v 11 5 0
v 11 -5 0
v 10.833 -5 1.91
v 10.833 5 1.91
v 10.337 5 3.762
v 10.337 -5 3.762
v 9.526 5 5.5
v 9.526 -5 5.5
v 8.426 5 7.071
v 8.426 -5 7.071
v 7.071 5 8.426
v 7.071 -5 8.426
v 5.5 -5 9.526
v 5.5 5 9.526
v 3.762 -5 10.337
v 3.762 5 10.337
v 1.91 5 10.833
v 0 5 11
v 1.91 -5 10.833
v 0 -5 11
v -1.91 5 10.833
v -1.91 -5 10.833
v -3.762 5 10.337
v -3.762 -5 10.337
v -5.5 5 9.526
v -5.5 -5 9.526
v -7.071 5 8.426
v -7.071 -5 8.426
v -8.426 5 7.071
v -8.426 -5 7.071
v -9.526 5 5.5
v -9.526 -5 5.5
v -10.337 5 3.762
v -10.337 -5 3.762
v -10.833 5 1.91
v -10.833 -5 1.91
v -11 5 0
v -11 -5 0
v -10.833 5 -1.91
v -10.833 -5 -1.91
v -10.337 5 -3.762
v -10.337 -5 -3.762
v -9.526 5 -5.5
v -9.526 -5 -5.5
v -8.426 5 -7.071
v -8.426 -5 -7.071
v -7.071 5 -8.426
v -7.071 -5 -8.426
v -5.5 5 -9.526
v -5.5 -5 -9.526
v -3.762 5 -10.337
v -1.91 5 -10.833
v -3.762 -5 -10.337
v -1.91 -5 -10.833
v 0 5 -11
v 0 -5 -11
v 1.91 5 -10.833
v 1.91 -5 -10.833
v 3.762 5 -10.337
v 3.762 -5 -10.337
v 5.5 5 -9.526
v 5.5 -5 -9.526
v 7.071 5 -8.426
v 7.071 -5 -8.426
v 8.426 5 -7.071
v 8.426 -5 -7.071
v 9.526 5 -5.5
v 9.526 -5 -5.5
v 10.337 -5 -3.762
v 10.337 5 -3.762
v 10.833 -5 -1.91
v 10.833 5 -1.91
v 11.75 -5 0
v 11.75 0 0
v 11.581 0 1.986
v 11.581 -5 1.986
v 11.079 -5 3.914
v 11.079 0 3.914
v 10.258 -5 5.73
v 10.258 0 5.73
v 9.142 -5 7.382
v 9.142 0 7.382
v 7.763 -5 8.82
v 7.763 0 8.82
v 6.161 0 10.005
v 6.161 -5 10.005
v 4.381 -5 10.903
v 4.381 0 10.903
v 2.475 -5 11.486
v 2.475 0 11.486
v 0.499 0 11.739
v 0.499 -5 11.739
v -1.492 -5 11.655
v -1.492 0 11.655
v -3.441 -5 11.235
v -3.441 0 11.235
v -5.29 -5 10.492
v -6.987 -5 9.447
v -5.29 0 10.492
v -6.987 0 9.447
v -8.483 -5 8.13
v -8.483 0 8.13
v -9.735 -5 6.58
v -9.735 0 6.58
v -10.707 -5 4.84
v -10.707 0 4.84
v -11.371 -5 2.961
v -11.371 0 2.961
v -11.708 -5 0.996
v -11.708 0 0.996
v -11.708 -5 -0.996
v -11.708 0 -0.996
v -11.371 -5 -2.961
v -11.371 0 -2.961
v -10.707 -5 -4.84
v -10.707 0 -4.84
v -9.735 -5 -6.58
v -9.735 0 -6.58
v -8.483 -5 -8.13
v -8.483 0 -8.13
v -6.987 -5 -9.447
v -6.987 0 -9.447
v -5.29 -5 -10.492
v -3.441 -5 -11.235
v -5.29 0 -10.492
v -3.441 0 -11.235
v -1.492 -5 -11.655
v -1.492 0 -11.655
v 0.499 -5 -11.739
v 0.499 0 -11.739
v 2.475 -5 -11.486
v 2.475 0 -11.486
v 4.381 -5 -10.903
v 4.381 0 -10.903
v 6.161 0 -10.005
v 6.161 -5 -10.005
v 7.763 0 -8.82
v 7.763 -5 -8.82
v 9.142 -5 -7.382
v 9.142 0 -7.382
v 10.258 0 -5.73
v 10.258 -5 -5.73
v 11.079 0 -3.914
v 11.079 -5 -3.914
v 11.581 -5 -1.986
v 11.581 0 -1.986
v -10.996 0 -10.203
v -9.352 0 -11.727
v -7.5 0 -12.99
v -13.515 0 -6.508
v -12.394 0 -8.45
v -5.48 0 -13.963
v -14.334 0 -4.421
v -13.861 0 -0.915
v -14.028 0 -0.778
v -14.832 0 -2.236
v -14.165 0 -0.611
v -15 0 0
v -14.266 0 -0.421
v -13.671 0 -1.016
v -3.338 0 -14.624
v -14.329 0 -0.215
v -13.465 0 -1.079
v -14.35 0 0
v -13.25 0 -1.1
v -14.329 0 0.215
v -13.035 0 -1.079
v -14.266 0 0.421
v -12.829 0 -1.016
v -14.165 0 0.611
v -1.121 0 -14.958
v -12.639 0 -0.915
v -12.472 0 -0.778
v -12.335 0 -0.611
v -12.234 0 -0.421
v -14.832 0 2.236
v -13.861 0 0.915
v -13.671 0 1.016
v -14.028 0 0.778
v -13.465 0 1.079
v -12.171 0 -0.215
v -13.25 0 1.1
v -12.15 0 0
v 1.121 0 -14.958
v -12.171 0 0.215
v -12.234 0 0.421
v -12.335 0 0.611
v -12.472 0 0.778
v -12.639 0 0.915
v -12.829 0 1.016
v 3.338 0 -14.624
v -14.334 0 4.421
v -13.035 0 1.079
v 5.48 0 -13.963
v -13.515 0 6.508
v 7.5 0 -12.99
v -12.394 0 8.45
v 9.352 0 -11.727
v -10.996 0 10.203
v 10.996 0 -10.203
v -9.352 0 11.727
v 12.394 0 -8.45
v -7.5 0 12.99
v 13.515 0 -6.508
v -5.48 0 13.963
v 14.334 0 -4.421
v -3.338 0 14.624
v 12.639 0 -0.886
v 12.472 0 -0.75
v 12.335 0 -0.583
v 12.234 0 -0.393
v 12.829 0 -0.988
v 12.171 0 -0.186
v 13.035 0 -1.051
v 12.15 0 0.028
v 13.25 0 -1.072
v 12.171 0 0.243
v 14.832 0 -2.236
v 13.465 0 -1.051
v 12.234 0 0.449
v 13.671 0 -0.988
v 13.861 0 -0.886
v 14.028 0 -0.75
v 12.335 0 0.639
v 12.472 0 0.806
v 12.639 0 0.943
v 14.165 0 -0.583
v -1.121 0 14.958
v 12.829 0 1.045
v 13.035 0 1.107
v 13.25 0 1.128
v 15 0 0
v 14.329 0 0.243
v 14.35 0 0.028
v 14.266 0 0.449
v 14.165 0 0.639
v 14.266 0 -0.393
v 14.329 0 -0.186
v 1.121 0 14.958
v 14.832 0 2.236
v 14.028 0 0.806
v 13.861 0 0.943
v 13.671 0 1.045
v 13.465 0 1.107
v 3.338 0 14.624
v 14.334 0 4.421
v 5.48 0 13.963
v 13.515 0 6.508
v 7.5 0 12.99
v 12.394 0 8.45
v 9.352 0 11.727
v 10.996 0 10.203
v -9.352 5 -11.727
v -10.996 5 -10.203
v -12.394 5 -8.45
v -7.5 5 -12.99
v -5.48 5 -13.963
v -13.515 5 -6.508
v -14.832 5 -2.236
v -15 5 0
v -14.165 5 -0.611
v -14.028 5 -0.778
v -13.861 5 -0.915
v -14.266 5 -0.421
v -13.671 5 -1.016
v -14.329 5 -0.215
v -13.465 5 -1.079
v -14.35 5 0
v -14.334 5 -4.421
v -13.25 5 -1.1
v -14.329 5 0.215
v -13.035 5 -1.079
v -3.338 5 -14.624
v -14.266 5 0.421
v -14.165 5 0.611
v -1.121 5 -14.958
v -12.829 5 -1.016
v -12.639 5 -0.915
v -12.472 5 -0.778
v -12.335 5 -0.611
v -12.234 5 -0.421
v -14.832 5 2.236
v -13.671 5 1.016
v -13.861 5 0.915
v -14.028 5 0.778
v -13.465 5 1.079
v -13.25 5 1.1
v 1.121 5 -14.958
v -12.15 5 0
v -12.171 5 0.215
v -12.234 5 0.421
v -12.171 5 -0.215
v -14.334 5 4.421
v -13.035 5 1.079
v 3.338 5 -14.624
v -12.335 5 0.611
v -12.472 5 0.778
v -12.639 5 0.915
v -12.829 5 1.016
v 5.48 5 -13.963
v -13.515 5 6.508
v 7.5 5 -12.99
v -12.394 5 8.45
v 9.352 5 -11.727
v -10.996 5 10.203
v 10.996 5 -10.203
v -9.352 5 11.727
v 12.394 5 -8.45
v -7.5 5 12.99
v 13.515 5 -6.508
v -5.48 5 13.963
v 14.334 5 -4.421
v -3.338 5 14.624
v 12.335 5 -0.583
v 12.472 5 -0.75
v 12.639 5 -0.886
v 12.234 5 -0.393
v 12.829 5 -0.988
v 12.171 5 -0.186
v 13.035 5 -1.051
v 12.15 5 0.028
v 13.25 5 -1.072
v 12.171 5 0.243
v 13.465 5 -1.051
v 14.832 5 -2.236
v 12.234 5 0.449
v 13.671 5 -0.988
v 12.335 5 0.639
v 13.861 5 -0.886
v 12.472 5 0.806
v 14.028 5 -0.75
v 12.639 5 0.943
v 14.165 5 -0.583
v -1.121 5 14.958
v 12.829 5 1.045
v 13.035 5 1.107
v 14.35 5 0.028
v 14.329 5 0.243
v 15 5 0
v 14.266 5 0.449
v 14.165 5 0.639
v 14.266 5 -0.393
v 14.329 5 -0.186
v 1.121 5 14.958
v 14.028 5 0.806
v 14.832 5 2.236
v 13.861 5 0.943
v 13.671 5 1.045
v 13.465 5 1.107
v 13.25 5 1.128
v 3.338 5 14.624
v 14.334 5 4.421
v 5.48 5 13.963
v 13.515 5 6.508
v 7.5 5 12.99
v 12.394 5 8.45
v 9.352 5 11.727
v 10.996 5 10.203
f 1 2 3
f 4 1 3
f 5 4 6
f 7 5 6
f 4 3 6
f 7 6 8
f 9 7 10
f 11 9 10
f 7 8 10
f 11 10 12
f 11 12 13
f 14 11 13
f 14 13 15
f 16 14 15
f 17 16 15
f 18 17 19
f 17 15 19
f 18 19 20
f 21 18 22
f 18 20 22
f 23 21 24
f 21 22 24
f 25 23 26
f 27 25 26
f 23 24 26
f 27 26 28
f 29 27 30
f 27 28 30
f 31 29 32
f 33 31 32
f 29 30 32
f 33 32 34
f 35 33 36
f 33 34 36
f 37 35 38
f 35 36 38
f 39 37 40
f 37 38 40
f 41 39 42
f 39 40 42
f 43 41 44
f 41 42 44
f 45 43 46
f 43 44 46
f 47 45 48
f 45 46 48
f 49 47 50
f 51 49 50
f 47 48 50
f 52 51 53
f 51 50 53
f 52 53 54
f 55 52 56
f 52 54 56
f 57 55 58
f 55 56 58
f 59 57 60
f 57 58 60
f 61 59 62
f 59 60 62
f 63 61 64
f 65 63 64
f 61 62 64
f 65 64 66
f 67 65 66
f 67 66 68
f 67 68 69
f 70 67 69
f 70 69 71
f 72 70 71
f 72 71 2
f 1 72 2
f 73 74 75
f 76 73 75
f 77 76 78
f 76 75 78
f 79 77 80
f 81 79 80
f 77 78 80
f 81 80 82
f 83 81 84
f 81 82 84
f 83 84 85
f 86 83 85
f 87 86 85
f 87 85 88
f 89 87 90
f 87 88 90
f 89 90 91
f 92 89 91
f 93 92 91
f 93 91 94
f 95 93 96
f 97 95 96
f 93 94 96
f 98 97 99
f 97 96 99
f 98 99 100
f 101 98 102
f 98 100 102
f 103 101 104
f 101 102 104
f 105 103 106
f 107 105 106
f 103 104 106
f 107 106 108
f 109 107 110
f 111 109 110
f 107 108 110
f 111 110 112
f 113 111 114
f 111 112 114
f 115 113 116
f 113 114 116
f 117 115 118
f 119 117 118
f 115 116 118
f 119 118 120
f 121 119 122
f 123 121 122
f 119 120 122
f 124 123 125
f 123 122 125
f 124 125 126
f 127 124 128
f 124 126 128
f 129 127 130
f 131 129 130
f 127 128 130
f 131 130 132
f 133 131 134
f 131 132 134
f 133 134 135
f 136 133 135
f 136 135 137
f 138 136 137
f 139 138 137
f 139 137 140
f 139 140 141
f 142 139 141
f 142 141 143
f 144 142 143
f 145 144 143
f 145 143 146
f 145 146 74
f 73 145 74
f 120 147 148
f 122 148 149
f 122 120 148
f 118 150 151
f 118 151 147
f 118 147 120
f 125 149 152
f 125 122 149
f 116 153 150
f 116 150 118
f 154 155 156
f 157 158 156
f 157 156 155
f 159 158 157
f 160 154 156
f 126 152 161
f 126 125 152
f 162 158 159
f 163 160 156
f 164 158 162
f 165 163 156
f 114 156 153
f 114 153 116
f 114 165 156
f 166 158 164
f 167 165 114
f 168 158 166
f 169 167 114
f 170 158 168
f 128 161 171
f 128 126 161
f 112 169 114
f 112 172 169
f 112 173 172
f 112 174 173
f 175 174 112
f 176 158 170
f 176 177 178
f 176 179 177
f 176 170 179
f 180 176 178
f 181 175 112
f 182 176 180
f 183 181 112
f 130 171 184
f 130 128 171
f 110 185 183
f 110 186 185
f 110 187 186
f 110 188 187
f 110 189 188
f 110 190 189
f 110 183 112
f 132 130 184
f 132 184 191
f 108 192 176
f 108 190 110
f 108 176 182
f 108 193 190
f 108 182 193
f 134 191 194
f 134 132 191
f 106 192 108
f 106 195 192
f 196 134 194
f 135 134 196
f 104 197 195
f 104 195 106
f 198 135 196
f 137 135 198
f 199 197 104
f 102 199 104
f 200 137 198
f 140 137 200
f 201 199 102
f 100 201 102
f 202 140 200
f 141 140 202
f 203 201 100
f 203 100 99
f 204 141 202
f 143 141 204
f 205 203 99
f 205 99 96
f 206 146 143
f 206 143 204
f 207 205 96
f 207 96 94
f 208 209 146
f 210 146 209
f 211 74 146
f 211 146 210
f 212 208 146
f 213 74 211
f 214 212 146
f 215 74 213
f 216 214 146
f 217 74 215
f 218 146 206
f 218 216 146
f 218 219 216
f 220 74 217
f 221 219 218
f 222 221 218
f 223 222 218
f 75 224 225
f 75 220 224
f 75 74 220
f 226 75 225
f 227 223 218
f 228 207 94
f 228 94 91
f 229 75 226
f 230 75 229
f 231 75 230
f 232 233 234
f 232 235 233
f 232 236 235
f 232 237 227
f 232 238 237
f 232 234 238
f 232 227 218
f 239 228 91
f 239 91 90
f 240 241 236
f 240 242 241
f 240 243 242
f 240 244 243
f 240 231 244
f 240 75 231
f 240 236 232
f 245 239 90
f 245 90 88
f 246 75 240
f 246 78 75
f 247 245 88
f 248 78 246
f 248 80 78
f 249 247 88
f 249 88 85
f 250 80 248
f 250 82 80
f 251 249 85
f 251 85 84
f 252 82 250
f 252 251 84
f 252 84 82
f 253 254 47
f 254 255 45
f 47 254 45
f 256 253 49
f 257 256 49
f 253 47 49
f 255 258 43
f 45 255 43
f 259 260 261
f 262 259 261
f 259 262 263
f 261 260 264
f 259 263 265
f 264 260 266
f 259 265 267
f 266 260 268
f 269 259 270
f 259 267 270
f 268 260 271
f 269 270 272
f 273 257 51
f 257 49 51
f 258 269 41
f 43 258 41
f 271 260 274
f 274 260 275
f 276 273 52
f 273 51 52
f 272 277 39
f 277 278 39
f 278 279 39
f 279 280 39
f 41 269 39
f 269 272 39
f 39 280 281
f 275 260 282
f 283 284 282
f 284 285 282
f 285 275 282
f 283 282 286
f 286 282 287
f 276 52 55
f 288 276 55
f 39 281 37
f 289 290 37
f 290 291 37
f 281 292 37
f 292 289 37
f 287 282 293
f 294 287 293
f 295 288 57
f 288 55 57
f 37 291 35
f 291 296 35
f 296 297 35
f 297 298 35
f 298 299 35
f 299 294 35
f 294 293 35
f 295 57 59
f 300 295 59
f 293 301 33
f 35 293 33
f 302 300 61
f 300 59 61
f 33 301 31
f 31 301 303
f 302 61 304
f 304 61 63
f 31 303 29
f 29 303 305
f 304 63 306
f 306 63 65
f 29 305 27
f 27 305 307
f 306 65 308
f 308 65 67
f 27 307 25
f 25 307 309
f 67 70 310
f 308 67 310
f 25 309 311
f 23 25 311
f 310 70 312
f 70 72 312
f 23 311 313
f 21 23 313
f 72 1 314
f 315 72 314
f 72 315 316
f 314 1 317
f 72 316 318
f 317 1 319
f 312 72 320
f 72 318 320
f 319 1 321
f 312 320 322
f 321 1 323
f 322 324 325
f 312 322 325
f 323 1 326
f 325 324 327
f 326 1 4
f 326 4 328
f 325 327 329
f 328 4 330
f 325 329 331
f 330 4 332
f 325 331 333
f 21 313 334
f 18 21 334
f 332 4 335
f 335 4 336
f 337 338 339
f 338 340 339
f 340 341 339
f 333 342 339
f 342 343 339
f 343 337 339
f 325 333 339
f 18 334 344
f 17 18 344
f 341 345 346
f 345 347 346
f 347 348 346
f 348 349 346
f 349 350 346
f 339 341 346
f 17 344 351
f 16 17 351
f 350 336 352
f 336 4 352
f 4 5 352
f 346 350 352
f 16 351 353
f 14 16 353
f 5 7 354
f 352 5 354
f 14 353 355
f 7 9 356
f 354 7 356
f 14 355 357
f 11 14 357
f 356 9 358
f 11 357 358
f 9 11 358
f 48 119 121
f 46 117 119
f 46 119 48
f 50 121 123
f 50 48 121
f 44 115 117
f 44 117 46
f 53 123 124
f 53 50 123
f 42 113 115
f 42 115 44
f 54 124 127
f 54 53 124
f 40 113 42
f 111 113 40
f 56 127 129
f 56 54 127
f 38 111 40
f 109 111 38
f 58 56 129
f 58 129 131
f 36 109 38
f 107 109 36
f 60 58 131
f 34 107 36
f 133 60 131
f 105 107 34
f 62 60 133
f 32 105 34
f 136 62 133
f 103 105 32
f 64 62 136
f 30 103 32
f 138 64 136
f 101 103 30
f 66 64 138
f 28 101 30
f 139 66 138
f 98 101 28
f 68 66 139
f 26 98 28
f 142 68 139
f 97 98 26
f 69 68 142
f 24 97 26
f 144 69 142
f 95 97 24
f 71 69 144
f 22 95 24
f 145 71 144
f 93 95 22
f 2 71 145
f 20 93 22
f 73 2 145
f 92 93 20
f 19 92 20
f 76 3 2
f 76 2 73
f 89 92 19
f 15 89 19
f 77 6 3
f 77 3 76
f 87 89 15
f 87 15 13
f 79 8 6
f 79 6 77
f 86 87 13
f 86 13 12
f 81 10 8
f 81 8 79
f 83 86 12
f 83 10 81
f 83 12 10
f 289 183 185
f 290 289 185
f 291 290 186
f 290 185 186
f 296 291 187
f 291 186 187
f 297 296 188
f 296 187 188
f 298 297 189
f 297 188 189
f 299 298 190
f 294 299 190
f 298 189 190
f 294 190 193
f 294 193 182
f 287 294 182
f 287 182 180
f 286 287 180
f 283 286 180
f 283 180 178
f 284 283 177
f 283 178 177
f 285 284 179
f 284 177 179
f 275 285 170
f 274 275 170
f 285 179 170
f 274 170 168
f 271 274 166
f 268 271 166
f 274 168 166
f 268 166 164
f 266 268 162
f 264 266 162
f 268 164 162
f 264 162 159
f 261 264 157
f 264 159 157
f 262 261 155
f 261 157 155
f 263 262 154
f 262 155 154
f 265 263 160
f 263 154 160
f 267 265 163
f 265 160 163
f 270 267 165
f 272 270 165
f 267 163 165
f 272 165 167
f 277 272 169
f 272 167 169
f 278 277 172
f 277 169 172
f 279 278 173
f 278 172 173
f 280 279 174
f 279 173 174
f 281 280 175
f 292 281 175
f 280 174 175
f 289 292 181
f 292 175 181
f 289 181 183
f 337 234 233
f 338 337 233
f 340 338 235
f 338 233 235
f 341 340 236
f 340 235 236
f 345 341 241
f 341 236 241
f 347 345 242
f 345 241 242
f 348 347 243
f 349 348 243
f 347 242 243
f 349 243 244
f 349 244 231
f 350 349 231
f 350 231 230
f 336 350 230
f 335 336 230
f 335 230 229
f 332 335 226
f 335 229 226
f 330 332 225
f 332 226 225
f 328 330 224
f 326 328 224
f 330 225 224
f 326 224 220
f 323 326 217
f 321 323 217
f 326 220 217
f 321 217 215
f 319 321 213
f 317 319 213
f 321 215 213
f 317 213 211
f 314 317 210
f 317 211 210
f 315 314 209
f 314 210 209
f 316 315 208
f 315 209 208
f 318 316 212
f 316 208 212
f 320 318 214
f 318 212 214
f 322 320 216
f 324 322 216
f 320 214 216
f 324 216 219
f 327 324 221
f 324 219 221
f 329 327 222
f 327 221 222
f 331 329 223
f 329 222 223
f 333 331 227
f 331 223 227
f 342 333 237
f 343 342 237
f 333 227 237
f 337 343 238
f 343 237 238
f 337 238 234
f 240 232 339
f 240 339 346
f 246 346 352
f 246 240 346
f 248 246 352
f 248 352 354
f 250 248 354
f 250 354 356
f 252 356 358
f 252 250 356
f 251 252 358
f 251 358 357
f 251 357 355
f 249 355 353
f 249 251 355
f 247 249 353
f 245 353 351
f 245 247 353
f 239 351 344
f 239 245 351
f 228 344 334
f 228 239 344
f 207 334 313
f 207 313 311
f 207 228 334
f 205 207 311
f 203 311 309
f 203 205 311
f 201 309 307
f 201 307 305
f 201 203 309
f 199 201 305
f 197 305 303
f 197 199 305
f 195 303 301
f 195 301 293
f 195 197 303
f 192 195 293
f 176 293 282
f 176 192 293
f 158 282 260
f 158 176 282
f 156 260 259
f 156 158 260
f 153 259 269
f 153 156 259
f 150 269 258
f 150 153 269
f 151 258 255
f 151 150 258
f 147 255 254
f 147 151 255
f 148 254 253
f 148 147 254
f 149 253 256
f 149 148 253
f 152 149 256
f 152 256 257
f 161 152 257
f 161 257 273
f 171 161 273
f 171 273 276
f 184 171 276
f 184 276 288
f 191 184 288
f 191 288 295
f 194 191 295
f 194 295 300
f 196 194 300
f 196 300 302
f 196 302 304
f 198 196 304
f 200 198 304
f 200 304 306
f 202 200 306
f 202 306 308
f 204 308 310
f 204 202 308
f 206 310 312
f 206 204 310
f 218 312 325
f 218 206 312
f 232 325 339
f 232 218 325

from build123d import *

# Parameters (mm, degrees)
F0_R     = 15
F2_DEPTH = 5
F1_R     = 1.1
F3_DEPTH = 5
F4_DEPTH = 5
F5_R     = 11.75
F6_DEPTH = 5
F7_R     = 11
F8_DEPTH = 10


with BuildPart() as f2:
    # F0 (on Front) → F2 (new body)
    with BuildSketch(Plane.XZ):
        Circle(F0_R)
    extrude(amount=-F2_DEPTH)

    # F1 (on Front) → F3 (cut)
    with BuildSketch(Plane.XZ):
        with Locations((-13.25, 0)):
            Circle(F1_R)
    extrude(amount=-F3_DEPTH, mode=Mode.SUBTRACT)

    # F1 (on Front) → F4 (cut)
    with BuildSketch(Plane.XZ):
        with Locations((-13.25, 0)):
            Circle(F1_R)
        with Locations((13.25, 0.028307)):
            Circle(F1_R)
    extrude(amount=-F4_DEPTH, mode=Mode.SUBTRACT)

    # F5 (on face) → F6 (join)
    with BuildSketch(Plane.XZ):
        Circle(F5_R)
    extrude(amount=F6_DEPTH)

    # F7 (on face) → F8 (cut)
    with BuildSketch(Plane.XZ.offset(5)):
        Circle(F7_R)
    extrude(amount=-F8_DEPTH, mode=Mode.SUBTRACT)


solid = f2.part
